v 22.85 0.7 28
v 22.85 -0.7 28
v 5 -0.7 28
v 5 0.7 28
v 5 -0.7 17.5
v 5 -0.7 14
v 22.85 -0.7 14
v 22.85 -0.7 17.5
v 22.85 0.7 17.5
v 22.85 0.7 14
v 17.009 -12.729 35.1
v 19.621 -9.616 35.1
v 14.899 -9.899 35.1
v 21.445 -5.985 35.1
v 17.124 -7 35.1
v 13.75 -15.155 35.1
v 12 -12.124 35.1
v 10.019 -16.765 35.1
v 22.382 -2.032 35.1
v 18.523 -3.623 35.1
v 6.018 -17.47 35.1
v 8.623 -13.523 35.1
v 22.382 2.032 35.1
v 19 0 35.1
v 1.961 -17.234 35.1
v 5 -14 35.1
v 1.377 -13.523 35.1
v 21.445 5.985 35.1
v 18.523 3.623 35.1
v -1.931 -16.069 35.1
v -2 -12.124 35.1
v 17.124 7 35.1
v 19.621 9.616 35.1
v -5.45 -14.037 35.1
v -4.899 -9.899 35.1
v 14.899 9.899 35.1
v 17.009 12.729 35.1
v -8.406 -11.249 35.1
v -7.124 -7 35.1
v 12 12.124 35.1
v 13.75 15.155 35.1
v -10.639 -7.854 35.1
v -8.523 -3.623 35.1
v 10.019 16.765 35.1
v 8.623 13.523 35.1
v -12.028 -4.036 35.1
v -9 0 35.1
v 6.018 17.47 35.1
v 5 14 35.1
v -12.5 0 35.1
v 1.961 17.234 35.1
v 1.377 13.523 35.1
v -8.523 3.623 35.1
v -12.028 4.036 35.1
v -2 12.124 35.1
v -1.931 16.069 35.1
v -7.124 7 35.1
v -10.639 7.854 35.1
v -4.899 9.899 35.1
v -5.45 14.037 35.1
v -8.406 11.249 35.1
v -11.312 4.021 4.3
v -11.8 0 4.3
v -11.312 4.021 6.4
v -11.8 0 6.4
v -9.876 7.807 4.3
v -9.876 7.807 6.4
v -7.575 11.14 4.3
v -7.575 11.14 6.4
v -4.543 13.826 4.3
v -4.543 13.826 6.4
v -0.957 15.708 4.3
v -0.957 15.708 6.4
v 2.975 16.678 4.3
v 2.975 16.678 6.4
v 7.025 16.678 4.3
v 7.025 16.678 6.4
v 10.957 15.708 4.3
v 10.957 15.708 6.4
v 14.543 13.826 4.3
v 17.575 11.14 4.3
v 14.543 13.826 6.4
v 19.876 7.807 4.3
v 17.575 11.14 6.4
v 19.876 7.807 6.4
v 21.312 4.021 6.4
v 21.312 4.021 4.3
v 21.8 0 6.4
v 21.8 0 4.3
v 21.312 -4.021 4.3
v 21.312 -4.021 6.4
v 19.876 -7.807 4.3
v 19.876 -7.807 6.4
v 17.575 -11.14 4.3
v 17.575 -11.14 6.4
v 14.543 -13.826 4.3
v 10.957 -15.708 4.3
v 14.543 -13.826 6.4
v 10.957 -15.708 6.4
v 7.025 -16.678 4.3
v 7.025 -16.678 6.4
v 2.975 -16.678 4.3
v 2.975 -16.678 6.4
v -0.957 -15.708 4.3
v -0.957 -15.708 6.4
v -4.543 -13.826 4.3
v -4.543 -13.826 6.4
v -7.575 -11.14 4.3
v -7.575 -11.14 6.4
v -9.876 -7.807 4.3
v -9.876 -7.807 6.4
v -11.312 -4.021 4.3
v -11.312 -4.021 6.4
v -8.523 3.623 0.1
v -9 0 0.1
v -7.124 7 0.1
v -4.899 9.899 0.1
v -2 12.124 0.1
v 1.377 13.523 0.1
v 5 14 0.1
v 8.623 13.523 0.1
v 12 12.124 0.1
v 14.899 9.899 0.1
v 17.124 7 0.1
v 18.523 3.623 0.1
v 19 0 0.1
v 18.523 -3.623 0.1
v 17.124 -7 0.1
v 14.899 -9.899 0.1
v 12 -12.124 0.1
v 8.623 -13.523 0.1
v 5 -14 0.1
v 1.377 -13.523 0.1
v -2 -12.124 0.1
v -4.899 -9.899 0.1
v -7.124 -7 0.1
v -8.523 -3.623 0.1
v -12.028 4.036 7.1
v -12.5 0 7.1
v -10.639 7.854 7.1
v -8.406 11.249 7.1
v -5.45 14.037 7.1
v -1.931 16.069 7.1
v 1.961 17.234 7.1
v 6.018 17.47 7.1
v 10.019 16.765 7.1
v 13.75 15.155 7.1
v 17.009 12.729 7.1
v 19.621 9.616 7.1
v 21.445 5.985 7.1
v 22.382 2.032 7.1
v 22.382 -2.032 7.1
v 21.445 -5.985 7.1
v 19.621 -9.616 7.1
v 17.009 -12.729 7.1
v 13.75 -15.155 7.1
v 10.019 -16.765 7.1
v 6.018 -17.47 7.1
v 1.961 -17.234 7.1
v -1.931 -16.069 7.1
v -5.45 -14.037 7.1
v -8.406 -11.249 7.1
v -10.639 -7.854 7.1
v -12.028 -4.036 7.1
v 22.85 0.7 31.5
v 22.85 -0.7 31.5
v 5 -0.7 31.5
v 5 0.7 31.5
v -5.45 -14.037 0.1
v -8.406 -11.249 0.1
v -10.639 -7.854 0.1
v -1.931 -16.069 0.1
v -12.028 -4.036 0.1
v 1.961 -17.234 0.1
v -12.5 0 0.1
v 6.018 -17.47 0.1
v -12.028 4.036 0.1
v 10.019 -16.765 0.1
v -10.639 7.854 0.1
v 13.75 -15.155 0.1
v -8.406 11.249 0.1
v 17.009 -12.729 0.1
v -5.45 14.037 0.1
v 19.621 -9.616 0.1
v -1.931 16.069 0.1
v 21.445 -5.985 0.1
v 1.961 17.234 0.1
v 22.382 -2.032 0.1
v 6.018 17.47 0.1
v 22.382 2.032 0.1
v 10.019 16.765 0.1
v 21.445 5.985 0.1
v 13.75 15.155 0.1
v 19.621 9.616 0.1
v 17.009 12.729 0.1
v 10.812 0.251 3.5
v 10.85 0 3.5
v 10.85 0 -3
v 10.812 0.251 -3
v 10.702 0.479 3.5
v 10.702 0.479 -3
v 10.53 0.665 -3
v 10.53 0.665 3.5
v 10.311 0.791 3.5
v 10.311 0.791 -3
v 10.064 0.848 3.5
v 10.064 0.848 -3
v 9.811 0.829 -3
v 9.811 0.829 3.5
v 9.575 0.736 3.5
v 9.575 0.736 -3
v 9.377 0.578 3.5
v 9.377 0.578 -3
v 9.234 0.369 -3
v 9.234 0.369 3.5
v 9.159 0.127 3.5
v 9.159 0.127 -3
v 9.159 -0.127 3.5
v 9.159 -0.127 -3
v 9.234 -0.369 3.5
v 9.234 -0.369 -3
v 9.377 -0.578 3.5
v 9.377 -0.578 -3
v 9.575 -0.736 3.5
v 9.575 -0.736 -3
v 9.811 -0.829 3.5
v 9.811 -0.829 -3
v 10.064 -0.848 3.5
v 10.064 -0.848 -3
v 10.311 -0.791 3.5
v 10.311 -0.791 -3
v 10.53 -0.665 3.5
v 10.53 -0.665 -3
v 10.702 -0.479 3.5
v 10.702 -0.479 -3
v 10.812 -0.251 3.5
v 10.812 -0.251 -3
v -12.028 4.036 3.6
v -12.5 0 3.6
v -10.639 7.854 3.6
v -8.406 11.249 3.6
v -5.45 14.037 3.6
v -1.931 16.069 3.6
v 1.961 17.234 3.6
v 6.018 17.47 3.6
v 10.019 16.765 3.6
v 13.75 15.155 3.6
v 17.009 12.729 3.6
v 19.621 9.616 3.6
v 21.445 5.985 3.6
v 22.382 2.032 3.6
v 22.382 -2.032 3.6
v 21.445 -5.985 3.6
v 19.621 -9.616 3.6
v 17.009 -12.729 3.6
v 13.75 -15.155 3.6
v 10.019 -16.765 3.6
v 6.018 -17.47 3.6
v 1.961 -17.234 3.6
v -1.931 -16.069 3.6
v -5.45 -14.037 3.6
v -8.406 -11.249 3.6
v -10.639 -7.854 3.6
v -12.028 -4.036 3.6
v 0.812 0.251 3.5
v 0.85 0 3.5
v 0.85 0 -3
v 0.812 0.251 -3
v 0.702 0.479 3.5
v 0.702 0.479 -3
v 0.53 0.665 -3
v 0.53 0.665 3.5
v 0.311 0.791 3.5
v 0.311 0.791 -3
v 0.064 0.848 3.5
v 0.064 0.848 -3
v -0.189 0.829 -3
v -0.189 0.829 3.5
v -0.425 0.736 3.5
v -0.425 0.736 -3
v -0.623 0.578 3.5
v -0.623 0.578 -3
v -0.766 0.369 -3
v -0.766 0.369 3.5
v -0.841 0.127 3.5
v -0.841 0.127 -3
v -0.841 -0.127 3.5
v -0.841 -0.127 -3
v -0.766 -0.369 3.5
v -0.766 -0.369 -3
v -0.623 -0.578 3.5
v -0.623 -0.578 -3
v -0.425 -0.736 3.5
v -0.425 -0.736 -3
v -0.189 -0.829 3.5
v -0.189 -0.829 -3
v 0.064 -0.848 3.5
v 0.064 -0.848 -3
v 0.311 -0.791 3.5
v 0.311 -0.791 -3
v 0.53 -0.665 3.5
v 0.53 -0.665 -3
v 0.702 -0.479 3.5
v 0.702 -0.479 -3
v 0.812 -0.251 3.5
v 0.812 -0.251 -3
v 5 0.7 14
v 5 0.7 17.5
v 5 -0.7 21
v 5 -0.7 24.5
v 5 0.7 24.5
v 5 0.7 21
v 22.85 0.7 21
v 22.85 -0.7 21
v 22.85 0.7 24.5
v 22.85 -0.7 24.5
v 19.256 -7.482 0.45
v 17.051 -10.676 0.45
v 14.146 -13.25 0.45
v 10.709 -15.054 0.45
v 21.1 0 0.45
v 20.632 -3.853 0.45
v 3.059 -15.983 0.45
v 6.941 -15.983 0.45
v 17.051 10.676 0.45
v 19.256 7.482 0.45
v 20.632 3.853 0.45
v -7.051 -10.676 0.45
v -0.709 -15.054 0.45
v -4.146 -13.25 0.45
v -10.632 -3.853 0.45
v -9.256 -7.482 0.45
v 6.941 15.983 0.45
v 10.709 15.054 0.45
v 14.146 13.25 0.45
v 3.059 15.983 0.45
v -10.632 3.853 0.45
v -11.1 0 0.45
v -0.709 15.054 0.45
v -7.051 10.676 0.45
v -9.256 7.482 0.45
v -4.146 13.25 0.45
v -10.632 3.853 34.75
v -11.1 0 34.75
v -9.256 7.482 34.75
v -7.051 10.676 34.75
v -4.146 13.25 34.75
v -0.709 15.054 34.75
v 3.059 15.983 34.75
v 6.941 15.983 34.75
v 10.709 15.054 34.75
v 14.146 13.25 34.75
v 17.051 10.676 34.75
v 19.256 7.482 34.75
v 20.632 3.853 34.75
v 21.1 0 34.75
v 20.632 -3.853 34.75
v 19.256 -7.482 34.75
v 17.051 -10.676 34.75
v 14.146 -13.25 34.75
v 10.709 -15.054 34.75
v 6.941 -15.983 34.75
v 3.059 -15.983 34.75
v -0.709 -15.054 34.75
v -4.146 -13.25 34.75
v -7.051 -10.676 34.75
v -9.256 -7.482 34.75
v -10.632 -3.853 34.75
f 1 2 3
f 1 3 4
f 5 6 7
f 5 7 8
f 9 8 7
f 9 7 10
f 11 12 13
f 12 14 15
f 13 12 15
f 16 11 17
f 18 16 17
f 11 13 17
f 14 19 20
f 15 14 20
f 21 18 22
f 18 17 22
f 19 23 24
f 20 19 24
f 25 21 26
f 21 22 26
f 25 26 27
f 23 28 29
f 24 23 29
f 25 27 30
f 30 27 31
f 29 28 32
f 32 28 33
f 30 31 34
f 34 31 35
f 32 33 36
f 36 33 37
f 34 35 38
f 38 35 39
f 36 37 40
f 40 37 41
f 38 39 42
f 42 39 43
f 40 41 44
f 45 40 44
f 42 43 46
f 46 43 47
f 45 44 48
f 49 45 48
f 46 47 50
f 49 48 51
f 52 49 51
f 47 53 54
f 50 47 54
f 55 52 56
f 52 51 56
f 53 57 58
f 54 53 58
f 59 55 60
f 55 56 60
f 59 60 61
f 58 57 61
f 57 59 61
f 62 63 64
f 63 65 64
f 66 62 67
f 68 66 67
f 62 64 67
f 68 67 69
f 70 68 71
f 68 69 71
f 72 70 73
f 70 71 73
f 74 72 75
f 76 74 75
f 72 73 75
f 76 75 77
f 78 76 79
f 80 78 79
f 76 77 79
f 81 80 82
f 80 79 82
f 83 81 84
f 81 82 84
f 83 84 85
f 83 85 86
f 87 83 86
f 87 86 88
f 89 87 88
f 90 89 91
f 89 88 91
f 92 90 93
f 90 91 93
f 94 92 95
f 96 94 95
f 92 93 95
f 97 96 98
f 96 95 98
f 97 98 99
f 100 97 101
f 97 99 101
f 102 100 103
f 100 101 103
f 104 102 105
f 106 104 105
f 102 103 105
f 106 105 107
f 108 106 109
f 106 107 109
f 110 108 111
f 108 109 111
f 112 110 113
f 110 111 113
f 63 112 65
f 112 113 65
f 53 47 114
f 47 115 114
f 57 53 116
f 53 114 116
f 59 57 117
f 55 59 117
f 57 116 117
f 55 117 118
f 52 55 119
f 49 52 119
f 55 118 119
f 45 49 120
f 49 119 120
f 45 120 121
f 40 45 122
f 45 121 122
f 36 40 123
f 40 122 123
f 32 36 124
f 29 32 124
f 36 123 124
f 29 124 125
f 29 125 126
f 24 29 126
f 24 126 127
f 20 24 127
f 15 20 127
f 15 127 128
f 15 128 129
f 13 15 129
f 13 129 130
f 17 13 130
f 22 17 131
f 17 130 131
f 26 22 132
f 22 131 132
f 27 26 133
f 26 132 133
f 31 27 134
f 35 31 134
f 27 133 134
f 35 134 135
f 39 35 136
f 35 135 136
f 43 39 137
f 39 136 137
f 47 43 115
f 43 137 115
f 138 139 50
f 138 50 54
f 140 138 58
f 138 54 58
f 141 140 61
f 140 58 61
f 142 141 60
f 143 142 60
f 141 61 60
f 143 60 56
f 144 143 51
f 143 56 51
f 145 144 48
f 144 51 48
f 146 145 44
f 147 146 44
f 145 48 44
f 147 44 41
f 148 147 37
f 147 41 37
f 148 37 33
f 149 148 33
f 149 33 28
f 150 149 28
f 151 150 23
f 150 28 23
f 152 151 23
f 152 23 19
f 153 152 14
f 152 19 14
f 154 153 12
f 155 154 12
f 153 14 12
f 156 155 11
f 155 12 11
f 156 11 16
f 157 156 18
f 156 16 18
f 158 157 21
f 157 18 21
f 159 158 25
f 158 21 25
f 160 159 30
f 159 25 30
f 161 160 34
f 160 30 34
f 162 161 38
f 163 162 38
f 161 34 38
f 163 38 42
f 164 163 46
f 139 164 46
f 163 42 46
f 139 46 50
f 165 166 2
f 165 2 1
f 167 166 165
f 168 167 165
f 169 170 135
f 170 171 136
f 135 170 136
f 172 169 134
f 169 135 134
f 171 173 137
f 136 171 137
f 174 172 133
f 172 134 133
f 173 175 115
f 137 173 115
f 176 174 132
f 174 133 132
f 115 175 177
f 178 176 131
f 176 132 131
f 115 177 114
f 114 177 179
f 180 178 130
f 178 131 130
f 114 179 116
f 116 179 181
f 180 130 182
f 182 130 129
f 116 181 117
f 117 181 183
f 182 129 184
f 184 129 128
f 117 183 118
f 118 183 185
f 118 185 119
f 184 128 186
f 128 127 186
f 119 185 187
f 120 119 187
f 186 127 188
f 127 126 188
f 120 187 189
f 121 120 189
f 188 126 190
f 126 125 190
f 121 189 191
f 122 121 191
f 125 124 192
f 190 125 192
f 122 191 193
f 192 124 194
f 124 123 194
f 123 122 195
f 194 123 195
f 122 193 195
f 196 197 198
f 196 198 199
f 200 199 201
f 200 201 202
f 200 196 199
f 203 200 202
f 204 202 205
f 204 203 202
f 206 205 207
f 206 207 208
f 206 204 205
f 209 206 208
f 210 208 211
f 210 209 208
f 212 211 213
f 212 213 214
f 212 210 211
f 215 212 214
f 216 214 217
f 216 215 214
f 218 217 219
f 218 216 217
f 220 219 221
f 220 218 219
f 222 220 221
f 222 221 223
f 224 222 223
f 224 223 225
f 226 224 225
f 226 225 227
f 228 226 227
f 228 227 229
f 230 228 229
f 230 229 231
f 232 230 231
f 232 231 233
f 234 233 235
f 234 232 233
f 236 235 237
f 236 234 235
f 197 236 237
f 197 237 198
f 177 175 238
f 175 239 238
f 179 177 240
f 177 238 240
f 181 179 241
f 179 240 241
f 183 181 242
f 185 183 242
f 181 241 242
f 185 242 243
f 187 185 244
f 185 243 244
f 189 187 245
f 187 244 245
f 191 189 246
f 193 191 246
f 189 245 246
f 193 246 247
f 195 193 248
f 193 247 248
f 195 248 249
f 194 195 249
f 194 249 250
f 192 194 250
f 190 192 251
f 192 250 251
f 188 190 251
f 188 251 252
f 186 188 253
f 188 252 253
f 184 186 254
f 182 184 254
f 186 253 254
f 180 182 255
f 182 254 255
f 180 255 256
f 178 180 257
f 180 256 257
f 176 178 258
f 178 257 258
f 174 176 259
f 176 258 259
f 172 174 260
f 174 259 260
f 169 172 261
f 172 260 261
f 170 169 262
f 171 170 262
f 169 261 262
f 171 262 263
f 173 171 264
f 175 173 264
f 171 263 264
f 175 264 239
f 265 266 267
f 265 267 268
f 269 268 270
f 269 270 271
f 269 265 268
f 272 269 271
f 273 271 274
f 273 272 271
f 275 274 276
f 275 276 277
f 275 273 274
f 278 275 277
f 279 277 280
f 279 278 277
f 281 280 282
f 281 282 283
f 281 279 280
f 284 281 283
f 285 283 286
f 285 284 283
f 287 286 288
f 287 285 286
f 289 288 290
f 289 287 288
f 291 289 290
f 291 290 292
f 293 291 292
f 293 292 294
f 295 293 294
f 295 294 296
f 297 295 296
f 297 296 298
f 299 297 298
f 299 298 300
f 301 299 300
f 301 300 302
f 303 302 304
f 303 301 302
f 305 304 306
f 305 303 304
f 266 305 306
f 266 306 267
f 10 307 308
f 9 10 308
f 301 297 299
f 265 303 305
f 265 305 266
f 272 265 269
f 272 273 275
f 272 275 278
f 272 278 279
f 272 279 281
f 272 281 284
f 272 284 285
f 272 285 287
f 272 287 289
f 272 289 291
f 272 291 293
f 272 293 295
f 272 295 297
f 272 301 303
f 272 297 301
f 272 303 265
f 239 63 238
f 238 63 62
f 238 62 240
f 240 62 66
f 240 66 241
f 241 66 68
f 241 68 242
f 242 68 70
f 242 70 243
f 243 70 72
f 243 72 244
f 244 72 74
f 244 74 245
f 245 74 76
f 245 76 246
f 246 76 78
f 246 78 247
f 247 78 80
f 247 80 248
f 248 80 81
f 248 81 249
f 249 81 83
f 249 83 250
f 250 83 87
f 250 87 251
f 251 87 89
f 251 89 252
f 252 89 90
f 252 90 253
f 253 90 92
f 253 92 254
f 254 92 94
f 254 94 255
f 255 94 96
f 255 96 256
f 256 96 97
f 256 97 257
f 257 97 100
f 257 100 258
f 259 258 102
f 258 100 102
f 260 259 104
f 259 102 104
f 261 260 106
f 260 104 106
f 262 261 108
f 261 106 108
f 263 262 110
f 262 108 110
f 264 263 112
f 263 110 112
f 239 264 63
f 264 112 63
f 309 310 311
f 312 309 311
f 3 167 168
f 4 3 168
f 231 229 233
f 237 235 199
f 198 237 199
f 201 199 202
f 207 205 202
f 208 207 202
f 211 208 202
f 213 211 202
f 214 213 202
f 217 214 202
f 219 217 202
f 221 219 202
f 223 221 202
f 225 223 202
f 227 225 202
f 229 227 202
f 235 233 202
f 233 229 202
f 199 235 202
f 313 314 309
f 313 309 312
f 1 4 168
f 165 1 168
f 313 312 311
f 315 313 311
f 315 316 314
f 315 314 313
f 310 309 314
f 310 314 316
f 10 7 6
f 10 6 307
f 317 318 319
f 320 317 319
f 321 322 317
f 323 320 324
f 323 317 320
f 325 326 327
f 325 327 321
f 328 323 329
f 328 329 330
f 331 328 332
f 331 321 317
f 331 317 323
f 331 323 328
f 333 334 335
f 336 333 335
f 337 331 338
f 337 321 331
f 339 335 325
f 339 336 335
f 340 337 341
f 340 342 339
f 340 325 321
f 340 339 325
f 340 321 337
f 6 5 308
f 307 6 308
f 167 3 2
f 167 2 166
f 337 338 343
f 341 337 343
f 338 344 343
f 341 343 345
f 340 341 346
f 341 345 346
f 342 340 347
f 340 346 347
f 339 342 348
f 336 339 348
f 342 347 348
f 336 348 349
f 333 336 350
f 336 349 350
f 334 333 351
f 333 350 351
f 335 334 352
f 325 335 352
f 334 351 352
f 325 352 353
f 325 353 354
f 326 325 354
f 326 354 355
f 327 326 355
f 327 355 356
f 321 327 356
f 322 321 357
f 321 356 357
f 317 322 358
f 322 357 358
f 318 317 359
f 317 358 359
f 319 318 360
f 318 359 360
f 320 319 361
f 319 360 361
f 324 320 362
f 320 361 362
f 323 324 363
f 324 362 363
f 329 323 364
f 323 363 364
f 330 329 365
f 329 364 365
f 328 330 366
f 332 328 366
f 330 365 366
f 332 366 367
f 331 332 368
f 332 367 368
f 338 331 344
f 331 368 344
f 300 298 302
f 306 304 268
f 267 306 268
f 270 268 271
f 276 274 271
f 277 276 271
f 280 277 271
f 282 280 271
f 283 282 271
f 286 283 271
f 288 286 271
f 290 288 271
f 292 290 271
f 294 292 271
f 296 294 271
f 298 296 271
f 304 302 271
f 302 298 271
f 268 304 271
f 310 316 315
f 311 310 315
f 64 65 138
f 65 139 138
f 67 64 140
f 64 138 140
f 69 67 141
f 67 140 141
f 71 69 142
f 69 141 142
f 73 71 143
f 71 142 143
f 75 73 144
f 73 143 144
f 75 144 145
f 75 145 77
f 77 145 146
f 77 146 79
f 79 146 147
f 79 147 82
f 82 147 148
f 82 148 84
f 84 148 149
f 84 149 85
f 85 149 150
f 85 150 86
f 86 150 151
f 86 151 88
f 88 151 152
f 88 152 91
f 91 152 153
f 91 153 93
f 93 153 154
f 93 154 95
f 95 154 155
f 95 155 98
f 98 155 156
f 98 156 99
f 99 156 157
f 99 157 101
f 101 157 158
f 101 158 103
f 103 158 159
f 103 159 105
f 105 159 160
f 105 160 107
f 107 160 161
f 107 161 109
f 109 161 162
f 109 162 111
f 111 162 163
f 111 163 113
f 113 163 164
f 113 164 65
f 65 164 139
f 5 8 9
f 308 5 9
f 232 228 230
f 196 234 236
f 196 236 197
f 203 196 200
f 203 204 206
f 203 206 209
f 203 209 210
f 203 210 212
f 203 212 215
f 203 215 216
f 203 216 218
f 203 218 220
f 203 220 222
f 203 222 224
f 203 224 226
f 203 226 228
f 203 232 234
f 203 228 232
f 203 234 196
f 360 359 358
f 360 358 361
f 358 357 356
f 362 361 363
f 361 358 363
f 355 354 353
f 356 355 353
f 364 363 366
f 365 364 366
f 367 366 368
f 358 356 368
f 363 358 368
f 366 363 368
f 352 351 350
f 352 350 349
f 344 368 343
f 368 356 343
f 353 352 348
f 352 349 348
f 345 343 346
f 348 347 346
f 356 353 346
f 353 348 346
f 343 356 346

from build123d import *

# Parameters (mm, degrees)
SKETCH002_W  = 16.1
SKETCH002_H  = 34.3
SKETCH003_R  = 0.85
PAD_DEPTH    = 6.5
SKETCH004_W  = 1.4
SKETCH004_H  = 3.5
PAD001_DEPTH = 17.85


with BuildPart() as revolution:
    # Sketch → Revolution (revolve)
    with BuildSketch(Plane.XZ):
        Polygon((-12.5, 0.1), (-12.5, 3.6), (-11.8, 4.3), (-11.8, 6.4), (-12.5, 7.1), (-12.5, 35.1), (-9, 35.1), (-9, 0.1), align=None)
    revolve(axis=Axis((5, 0, 7.548619), (0, 0, -1)))


with BuildPart() as revolution001:
    # Sketch002 → Revolution001 (revolve)
    with BuildSketch(Plane.XZ):
        with Locations((-3.05, 17.6)):
            Rectangle(SKETCH002_W, SKETCH002_H)
    revolve(axis=Axis((5, 0, 4.680116), (0, 0, -1)))


with BuildPart() as pad:
    # Sketch003 → Pad (new body)
    with BuildSketch(Plane.XY.offset(3.5)):
        Circle(SKETCH003_R)
        with Locations((10, 0)):
            Circle(SKETCH003_R)
    extrude(amount=-PAD_DEPTH)


with BuildPart() as pad001:
    # Sketch004 → Pad001 (new body)
    with BuildSketch(Plane.YZ.offset(5)):
        with Locations((0, 15.75)):
            Rectangle(SKETCH004_W, SKETCH004_H)
        with Locations((0, 22.75)):
            Rectangle(SKETCH004_W, SKETCH004_H)
        with Locations((0, 29.75)):
            Rectangle(SKETCH004_W, SKETCH004_H)
    extrude(amount=PAD001_DEPTH)


solid = Compound([revolution.part, revolution001.part, pad.part, pad001.part])
